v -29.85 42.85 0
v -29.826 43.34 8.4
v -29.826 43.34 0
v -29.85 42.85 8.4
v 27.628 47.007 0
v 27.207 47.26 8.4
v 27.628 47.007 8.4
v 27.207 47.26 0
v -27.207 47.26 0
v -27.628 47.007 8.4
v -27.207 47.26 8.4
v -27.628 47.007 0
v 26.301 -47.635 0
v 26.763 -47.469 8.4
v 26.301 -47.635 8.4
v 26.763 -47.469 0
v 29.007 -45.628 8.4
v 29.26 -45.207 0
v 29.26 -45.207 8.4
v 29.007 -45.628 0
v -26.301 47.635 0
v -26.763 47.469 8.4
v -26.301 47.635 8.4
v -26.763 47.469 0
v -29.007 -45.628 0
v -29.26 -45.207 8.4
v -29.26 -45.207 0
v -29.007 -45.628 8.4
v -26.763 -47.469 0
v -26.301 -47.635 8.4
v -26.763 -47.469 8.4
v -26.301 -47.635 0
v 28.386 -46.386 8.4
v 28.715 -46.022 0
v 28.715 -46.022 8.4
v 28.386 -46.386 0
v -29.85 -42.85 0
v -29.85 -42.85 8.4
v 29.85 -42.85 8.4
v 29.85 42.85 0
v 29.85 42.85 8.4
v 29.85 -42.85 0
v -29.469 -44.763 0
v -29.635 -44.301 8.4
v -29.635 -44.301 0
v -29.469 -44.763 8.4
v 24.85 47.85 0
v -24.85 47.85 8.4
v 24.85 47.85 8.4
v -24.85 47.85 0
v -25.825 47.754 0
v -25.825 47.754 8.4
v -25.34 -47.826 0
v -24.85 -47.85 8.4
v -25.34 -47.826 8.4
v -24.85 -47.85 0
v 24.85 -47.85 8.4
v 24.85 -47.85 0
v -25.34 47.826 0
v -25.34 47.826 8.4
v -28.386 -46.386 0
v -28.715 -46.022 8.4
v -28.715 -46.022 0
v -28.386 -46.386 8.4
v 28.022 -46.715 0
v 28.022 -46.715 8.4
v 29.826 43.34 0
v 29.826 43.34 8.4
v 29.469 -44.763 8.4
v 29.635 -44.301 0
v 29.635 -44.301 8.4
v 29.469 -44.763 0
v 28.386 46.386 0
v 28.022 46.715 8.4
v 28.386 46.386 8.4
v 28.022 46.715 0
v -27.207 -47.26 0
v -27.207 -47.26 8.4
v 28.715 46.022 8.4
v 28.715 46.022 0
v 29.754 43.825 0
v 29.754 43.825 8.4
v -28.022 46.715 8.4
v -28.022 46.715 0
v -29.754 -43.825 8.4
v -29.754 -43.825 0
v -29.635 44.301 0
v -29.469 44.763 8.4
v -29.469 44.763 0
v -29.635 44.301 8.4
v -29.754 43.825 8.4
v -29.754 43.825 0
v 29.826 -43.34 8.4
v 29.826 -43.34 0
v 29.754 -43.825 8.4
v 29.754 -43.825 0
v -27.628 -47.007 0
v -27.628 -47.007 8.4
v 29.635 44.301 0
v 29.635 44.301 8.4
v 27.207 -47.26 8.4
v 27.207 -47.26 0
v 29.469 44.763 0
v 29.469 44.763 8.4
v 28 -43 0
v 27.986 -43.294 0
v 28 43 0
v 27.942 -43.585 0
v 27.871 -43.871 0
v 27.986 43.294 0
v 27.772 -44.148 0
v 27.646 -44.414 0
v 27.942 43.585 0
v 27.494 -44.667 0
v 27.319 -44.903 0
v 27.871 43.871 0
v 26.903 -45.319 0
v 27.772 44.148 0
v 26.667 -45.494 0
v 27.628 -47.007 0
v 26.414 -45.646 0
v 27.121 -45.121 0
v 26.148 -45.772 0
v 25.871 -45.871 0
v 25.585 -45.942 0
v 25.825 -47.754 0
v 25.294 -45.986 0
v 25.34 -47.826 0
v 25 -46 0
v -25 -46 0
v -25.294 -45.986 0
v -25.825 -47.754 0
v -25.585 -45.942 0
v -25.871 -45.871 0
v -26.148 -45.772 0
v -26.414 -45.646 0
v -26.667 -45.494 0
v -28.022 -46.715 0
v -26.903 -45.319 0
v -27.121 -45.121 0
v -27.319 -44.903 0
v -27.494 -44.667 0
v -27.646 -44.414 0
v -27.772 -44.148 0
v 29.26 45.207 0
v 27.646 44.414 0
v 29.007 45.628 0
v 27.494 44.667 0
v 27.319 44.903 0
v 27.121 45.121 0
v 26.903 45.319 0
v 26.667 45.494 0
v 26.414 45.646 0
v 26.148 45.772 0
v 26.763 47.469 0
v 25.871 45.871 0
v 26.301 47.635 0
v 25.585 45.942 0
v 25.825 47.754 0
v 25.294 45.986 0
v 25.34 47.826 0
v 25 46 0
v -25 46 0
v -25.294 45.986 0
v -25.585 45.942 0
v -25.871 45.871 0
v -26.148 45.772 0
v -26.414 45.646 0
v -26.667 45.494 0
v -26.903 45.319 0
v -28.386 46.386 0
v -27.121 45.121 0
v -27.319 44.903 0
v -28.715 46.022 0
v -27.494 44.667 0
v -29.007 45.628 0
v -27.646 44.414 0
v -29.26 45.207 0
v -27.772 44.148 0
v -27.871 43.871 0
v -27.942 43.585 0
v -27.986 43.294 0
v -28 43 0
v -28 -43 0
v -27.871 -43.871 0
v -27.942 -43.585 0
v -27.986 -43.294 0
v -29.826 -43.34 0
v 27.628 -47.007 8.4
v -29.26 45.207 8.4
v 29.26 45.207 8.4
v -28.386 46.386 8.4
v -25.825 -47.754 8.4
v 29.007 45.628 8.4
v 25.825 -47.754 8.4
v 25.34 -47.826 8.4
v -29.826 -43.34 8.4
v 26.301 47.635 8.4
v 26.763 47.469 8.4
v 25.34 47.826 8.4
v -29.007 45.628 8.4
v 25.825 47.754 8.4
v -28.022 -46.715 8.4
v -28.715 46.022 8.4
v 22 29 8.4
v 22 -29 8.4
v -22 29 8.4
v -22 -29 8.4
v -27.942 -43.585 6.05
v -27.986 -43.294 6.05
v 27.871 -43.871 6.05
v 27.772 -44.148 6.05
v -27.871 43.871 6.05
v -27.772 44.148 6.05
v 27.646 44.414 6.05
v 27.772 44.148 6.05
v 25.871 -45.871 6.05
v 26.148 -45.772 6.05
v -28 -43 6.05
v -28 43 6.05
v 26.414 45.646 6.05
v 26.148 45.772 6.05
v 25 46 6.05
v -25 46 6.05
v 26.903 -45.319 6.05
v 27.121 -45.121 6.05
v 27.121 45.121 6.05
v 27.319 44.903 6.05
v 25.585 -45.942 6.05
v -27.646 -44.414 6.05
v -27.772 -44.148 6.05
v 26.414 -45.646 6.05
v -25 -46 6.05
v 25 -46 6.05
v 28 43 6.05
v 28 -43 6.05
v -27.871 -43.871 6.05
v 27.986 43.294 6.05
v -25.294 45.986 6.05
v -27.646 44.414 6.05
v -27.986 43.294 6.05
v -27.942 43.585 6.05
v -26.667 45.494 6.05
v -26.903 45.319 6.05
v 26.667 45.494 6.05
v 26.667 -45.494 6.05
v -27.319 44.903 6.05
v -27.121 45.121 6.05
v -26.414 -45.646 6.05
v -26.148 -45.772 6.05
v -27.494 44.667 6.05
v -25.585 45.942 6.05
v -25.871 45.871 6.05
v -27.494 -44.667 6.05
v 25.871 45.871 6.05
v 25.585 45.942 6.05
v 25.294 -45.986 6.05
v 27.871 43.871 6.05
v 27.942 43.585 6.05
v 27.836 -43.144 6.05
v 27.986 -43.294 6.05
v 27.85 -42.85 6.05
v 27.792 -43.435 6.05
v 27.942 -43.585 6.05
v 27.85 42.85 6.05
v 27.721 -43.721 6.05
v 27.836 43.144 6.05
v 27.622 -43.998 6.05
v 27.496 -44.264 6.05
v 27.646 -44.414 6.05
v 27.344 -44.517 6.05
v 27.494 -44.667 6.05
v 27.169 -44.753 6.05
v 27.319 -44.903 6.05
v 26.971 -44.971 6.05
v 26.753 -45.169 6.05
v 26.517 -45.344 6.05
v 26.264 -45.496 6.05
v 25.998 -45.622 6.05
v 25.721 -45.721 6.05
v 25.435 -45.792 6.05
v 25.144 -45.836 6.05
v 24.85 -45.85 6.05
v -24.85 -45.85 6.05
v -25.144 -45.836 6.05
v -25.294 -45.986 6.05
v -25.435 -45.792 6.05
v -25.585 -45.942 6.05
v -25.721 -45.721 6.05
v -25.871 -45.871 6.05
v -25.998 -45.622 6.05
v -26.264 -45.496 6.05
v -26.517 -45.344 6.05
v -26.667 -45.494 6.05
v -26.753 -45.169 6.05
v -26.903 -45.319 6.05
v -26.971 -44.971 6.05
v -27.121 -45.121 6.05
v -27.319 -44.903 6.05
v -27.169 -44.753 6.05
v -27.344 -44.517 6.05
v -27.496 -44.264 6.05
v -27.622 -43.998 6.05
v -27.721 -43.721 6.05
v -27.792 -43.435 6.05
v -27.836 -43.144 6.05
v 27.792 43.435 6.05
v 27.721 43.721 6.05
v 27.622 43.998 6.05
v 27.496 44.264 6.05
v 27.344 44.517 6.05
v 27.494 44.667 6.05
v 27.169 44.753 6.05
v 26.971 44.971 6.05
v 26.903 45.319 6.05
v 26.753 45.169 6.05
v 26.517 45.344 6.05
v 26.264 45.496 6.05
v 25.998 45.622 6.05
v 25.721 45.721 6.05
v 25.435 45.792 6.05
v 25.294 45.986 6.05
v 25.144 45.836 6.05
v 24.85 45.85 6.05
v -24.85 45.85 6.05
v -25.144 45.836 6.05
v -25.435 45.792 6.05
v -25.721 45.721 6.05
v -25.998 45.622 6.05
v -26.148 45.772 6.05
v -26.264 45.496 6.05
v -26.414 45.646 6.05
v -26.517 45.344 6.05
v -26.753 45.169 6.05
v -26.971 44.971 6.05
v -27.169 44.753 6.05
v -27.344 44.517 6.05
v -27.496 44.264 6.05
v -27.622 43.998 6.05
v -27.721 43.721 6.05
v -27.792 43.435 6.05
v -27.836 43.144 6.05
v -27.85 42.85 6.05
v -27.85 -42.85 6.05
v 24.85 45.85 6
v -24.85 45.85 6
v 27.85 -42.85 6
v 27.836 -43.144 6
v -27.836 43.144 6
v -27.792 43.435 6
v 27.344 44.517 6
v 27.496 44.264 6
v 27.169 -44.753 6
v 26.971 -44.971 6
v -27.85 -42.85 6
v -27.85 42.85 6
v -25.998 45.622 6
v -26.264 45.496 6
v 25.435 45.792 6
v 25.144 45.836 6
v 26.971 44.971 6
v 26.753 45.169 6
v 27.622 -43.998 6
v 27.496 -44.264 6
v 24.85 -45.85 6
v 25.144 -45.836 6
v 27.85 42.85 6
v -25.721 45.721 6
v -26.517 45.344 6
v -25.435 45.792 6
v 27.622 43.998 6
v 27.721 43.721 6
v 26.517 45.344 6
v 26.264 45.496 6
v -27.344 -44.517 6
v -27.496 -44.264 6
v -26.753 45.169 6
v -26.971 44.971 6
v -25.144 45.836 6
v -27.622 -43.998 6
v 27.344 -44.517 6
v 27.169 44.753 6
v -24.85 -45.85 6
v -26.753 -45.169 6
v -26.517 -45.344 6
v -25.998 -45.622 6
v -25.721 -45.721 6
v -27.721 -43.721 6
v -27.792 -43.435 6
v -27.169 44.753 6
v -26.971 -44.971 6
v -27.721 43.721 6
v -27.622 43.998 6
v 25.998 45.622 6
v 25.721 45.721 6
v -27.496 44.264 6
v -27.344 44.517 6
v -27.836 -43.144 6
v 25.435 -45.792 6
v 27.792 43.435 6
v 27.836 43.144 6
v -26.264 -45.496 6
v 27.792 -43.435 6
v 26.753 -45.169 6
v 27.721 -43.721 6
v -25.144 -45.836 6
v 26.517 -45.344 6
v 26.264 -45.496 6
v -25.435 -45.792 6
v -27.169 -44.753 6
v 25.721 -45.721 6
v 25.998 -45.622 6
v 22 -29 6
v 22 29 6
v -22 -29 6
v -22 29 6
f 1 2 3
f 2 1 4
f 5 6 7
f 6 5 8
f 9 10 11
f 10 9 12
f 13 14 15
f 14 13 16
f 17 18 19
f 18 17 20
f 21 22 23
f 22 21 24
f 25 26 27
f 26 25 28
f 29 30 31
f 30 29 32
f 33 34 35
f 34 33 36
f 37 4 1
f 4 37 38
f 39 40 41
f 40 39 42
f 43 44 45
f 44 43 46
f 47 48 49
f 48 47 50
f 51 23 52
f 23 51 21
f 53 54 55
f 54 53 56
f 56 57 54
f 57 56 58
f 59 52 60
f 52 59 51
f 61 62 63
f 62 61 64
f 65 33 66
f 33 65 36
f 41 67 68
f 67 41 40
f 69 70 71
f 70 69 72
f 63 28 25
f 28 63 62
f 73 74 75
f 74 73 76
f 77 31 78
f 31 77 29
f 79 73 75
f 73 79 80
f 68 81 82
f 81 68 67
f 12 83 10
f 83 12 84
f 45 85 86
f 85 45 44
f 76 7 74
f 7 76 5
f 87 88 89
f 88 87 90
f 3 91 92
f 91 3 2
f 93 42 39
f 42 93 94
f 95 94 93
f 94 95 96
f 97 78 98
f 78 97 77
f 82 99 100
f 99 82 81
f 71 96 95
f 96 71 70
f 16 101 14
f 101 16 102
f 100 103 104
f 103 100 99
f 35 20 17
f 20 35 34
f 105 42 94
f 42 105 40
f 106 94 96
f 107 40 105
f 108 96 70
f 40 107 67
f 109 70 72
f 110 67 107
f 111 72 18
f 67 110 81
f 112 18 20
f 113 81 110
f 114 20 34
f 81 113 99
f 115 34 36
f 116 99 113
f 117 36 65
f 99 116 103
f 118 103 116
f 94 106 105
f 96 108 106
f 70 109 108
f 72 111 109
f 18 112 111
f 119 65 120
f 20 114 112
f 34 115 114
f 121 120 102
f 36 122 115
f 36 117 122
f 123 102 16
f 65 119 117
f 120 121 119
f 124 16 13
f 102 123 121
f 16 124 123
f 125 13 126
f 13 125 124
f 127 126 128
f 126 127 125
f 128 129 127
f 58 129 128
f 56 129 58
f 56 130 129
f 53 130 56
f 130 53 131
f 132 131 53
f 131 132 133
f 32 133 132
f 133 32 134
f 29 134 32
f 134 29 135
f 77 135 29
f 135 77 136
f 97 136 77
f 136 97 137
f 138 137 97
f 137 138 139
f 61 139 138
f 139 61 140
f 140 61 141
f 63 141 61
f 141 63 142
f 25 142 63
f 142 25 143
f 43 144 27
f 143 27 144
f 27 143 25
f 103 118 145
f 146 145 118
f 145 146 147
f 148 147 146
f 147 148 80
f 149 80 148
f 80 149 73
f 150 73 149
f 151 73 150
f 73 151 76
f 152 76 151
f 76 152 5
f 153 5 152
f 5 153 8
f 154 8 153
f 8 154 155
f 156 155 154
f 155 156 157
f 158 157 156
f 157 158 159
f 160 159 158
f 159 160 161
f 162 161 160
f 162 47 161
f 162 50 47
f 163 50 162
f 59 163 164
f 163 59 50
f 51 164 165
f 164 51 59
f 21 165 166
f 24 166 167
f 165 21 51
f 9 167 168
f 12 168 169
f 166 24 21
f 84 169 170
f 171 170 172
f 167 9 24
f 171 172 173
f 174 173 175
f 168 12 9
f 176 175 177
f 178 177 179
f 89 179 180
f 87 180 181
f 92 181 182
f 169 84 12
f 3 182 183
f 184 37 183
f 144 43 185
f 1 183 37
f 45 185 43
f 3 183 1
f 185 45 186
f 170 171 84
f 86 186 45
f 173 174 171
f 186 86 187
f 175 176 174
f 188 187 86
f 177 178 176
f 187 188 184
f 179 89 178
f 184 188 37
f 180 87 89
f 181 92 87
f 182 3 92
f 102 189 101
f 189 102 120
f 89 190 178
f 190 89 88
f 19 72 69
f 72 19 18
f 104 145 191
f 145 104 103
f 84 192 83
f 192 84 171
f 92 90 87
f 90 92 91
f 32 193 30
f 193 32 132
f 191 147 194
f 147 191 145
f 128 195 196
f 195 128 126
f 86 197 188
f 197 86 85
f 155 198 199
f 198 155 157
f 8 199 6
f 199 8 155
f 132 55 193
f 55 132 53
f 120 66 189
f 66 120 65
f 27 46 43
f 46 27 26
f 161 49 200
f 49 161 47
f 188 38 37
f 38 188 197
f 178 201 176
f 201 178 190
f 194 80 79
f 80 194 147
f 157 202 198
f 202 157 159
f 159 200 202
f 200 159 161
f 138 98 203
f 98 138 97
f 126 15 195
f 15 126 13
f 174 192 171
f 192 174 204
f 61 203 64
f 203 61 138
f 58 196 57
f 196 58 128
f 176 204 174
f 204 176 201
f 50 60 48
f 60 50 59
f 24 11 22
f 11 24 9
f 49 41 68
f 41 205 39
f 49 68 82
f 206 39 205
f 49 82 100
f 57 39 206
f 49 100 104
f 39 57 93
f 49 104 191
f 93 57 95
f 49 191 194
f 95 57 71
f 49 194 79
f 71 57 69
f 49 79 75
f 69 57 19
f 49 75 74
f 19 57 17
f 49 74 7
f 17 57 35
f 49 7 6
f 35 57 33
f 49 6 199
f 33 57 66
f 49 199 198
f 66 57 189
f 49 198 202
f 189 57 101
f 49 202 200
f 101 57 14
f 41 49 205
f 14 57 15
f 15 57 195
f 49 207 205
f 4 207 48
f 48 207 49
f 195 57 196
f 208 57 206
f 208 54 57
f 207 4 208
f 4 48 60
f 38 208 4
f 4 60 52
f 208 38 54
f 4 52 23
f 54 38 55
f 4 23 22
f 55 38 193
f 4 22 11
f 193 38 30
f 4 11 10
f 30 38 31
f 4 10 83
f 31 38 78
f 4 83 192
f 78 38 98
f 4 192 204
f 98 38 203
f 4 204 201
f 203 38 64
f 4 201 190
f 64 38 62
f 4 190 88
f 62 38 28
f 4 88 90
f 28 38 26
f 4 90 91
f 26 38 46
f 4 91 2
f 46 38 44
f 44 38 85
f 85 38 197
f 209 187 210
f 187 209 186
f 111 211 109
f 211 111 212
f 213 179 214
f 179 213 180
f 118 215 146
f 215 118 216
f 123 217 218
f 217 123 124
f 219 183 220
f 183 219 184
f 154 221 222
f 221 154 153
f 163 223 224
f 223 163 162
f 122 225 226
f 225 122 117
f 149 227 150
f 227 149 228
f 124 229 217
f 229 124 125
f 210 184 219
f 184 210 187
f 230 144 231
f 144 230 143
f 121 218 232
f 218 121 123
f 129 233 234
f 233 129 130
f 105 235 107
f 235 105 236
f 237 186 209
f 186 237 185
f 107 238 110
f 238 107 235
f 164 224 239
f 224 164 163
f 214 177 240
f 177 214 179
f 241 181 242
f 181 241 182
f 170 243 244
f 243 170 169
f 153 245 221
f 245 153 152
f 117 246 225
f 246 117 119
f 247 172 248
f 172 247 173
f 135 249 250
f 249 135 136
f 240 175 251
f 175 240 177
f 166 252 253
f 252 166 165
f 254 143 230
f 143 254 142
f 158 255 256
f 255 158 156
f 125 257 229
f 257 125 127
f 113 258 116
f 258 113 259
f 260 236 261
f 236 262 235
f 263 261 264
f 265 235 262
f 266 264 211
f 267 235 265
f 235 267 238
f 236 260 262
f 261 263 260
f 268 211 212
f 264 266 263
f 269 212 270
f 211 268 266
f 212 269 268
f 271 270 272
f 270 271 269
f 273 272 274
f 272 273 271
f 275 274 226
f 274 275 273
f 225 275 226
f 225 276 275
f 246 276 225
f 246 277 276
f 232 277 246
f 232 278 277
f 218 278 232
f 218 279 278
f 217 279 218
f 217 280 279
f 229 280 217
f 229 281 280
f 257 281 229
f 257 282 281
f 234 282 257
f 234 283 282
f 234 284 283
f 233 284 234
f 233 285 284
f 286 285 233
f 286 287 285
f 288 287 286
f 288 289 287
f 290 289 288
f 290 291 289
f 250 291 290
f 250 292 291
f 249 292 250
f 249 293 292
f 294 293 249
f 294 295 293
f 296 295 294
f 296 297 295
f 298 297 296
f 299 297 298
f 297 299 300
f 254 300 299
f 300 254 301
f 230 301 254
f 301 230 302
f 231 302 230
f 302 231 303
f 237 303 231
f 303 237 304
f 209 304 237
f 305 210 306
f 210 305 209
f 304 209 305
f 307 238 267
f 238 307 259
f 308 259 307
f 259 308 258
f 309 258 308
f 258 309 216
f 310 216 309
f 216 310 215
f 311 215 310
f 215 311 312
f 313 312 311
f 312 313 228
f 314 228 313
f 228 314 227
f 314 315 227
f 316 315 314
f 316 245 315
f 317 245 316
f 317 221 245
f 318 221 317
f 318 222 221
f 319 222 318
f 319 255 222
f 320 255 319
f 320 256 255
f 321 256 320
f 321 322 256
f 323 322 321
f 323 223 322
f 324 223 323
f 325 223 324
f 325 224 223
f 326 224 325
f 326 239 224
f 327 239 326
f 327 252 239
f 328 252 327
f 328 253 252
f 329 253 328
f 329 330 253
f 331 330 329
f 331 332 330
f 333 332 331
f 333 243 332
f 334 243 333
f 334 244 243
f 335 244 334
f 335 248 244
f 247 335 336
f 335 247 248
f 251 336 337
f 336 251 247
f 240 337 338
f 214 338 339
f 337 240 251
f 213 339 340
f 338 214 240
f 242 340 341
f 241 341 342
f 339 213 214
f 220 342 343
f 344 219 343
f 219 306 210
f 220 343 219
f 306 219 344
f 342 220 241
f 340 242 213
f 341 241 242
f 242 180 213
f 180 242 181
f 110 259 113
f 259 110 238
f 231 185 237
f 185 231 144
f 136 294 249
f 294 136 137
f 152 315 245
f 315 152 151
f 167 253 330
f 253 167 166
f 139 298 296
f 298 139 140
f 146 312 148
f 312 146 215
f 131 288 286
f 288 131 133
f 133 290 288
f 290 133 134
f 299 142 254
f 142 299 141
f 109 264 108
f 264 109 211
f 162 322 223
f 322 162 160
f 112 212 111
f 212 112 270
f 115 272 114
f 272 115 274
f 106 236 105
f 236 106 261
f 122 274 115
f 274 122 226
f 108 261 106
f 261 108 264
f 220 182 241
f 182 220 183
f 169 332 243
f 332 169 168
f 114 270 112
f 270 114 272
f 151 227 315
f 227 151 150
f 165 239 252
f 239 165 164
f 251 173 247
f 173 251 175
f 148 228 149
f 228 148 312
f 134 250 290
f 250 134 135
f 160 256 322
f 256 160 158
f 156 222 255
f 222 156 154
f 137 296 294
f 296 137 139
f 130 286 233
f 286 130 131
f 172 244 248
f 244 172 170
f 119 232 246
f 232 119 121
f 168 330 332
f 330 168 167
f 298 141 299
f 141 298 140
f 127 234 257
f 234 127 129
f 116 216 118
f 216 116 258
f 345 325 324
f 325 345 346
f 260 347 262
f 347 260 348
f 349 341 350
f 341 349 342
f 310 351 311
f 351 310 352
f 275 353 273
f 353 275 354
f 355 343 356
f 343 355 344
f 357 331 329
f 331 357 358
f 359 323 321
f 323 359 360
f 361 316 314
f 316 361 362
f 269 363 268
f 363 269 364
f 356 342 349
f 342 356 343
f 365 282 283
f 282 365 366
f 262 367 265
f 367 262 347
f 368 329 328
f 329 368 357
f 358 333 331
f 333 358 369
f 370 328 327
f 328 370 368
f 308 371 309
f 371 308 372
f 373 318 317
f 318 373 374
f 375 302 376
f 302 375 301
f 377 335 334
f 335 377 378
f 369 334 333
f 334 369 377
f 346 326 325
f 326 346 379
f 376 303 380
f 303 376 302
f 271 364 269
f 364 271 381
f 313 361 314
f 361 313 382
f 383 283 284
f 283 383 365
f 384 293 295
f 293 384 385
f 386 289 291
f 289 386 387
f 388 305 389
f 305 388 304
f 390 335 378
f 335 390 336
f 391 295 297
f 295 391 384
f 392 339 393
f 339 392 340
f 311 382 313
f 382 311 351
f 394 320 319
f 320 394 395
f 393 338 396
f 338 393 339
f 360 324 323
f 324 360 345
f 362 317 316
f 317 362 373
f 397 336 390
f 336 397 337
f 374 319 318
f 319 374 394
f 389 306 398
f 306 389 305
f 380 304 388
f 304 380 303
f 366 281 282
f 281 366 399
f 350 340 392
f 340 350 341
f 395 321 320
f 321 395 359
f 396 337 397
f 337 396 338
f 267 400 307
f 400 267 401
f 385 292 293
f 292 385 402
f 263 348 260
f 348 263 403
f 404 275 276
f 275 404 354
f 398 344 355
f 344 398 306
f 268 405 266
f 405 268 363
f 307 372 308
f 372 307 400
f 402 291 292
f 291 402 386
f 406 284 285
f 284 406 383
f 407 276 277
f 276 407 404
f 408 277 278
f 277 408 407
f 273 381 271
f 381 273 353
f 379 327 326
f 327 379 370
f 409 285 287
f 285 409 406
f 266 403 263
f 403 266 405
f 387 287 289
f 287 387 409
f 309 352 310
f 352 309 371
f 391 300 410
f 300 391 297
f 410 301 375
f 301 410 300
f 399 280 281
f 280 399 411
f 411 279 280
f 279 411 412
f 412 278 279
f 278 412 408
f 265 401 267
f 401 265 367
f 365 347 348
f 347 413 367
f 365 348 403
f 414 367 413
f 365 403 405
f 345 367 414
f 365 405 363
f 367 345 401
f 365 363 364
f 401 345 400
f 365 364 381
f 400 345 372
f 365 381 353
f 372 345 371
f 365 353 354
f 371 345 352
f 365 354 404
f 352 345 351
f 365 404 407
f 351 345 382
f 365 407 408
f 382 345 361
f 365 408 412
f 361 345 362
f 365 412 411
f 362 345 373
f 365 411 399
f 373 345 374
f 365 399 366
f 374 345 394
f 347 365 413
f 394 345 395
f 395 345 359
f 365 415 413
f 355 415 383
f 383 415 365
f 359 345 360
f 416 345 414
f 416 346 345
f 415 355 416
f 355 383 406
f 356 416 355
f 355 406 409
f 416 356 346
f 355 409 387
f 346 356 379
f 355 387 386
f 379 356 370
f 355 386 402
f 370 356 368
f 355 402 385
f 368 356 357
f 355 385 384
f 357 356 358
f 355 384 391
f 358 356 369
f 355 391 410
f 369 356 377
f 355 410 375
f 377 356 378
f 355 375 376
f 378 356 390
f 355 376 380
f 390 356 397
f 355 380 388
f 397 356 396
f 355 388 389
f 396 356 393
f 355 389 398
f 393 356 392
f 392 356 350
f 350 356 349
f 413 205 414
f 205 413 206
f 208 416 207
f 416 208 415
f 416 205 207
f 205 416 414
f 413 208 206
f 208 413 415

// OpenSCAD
// file: _esp32_display_case.scad
// =====================================
// ESP32-2432S028R display case ("Cheap Yellow Display" / CYD)
// Two-part snap-fit enclosure for the 2.8" 240x320 resistive-touch TFT board,
// with an integrated snap-in holder for the bundled touchscreen stylus.
// =====================================
// Parts:
//   case_back  -> case_back.stl   (rear shell + two stylus saddle clips)
//   case_front -> case_front.stl  (front bezel with display window + snap skirt)
//
// Orientation: both parts are modeled upright in print orientation (Z-up),
// origin-centred on X/Y with their base at z=0. No viewer rotation is applied
// (analogous to sink-tray / hex-connector).
//
// Board dimensions are published CYD community specs, NOT calipered — they are
// flagged "VERIFY w/ calipers" below and exposed as customizer parameters, so a
// test print should confirm board fit before a final print. The stylus numbers
// (pen_*) ARE measured from the caliper photos in issue #268.

$fn = 64;

// === Parameters (mm) ===

// --- Board (VERIFY w/ calipers; published ESP32-2432S028R specs) ---
board_w         = 50.5;  // PCB short-edge width (spec ~50.3)
board_l         = 86.5;  // PCB long-edge length (spec ~86.4)
pcb_thickness   = 1.7;
component_depth = 13;    // cavity depth below PCB back for ESP32/USB/JST

// --- Fit / walls ---
fit_clearance   = 0.4;   // total slack board-edge to wall (0.2/side)
wall            = 2.4;
corner_r        = 3;
post_size       = 5;     // corner support-post footprint (square)

// --- Front bezel ---
bezel_thickness = 2.4;
skirt_depth     = 6;
skirt_wall      = 2.0;
skirt_clearance = 0.3;

// --- Display window (2.8" active ~43.2 x 57.6; VERIFY) ---
window_w        = 44;
window_l        = 58;
window_off_w    = 0;
window_off_l    = 0;

// --- Wall port cutouts (generous; connector positions unknown) ---
corner_margin   = 8;     // solid material at each wall end
floor_rail      = 1.2;   // thin rail at bottom of each side cutout

// --- Touchscreen stylus holder (measured w/ calipers) ---
pen_holder      = true;  // toggle the stylus clips
pen_dia         = 4.1;   // stylus shaft diameter (measured 4.07)
pen_clip_clear  = 0.3;   // radial slack, clip bore vs shaft
pen_clip_grip   = 220;   // clip arc sweep, degrees (>180 retains the pen)
pen_clip_wall   = 1.6;   // clip wall thickness
pen_clip_len    = 9;     // length of each clip along the pen axis
pen_clip_span   = 55;    // center-to-center distance between the two clips
pen_clip_z      = 5;     // clip center height above shell floor

// === Derived ===
inner_w  = board_w + fit_clearance;
inner_l  = board_l + fit_clearance;
outer_w  = inner_w + 2 * wall;
outer_l  = inner_l + 2 * wall;
cavity_h = component_depth + pcb_thickness;
shell_h  = wall + cavity_h;

pen_ri = pen_dia / 2 + pen_clip_clear;   // clip bore radius
pen_ro = pen_ri + pen_clip_wall;         // clip outer radius

// Side-wall vent slot: from just above the floor rail up to the top rim.
vent_z0 = wall + floor_rail;
vent_h  = shell_h - vent_z0 + 0.1;
// The long (X) walls carry the stylus clips, so their vent is kept short enough
// to sit between the two clip footprints; the short (Y) walls vent the full
// span less the corner margins.
xvent_l = pen_holder ? max(0, pen_clip_span - pen_clip_len - 2)
                     : outer_l - 2 * corner_margin;
yvent_l = outer_w - 2 * corner_margin;

// === Modules ===

// Rounded-rect vertical prism: hull of four corner cylinders.
// Centred on X/Y, base at z=0.
module rbox(w, l, h, r) {
    hull()
        for (sx = [-1, 1], sy = [-1, 1])
            translate([sx * (w/2 - r), sy * (l/2 - r), 0])
                cylinder(r = r, h = h);
}

// One stylus saddle clip. Axis along Y, centred at origin, mouth opening
// facing +Z so the pen drops in from above (support-free print).
// The C wraps pen_clip_grip degrees; the top opening is 360 - pen_clip_grip.
module pen_clip(len) {
    // Mouth half-width, measured at the pen surface so the opening is narrower
    // than the pen (and therefore retains it) exactly when pen_clip_grip > 180.
    hw = (pen_dia / 2) * sin((360 - pen_clip_grip) / 2);
    difference() {
        rotate([90, 0, 0]) cylinder(r = pen_ro, h = len, center = true);
        // Bore (overshoot both ends in Y)
        rotate([90, 0, 0]) cylinder(r = pen_ri, h = len + 0.2, center = true);
        // Cut the top opening: remove the top region within the mouth width.
        translate([0, 0, (pen_ro + 1) / 2])
            cube([2 * hw, len + 0.2, pen_ro + 1], center = true);
    }
}

// Rear shell: origin-centred, base at z=0, opening toward +Z. Holds the board
// components and carries the two stylus clips on the +X long wall.
module case_back() {
    union() {
        difference() {
            // Outer solid
            rbox(outer_w, outer_l, shell_h, corner_r);

            // Interior cavity (from top of the floor up)
            translate([0, 0, wall])
                rbox(inner_w, inner_l, cavity_h + 0.1, max(0.5, corner_r - wall));

            // Side-wall port/vent cutouts — one centred per wall, cut fully
            // through the wall, floor_rail retained at the bottom.
            // +/-X long walls (span along Y); kept clear of the stylus clips.
            for (sx = [-1, 1])
                translate([sx * (inner_w/2 + wall/2), 0, vent_z0 + vent_h/2])
                    cube([wall + 0.2, xvent_l, vent_h], center = true);
            // +/-Y short walls (span along X)
            for (sy = [-1, 1])
                translate([0, sy * (inner_l/2 + wall/2), vent_z0 + vent_h/2])
                    cube([yvent_l, wall + 0.2, vent_h], center = true);
        }

        // Corner support posts (added after the cavity cut so they stand
        // inside it). Outer faces sit flush with the cavity walls and fuse.
        for (sx = [-1, 1], sy = [-1, 1])
            translate([sx * (inner_w/2 - post_size/2),
                       sy * (inner_l/2 - post_size/2),
                       wall + component_depth/2])
                cube([post_size, post_size, component_depth], center = true);

        // Stylus clips on the +X exterior long wall. The -0.8 overlap sinks the
        // clip's outer arc into the wall so it fuses.
        if (pen_holder)
            for (sy = [-1, 1])
                translate([outer_w/2 + pen_ro - 0.8, sy * pen_clip_span/2, pen_clip_z])
                    pen_clip(pen_clip_len);
    }
}

// Front bezel: origin-centred, skirt bottom at z=0. A faceplate with a display
// window and a downward skirt that snaps over the rear shell exterior.
module case_front() {
    difference() {
        union() {
            // Faceplate cap
            translate([0, 0, skirt_depth])
                rbox(outer_w, outer_l, bezel_thickness, corner_r);

            // Skirt: outer wall minus the shell-shaped cavity it slides over
            difference() {
                rbox(outer_w + 2 * skirt_wall, outer_l + 2 * skirt_wall,
                     skirt_depth + bezel_thickness, corner_r + skirt_wall);
                translate([0, 0, -0.05])
                    rbox(outer_w + skirt_clearance, outer_l + skirt_clearance,
                         skirt_depth + 0.1, corner_r);
            }
        }

        // Display window through the faceplate
        translate([window_off_w, window_off_l, skirt_depth + bezel_thickness/2])
            cube([window_w, window_l, bezel_thickness + 1], center = true);
    }
}

// Rendered individually:
//   case_back.scad  -> case_back.stl
//   case_front.scad -> case_front.stl
// main file
// ESP32 display case - front bezel with display window
// Render this file to generate case_front.stl

include <_esp32_display_case.scad>

case_front();
